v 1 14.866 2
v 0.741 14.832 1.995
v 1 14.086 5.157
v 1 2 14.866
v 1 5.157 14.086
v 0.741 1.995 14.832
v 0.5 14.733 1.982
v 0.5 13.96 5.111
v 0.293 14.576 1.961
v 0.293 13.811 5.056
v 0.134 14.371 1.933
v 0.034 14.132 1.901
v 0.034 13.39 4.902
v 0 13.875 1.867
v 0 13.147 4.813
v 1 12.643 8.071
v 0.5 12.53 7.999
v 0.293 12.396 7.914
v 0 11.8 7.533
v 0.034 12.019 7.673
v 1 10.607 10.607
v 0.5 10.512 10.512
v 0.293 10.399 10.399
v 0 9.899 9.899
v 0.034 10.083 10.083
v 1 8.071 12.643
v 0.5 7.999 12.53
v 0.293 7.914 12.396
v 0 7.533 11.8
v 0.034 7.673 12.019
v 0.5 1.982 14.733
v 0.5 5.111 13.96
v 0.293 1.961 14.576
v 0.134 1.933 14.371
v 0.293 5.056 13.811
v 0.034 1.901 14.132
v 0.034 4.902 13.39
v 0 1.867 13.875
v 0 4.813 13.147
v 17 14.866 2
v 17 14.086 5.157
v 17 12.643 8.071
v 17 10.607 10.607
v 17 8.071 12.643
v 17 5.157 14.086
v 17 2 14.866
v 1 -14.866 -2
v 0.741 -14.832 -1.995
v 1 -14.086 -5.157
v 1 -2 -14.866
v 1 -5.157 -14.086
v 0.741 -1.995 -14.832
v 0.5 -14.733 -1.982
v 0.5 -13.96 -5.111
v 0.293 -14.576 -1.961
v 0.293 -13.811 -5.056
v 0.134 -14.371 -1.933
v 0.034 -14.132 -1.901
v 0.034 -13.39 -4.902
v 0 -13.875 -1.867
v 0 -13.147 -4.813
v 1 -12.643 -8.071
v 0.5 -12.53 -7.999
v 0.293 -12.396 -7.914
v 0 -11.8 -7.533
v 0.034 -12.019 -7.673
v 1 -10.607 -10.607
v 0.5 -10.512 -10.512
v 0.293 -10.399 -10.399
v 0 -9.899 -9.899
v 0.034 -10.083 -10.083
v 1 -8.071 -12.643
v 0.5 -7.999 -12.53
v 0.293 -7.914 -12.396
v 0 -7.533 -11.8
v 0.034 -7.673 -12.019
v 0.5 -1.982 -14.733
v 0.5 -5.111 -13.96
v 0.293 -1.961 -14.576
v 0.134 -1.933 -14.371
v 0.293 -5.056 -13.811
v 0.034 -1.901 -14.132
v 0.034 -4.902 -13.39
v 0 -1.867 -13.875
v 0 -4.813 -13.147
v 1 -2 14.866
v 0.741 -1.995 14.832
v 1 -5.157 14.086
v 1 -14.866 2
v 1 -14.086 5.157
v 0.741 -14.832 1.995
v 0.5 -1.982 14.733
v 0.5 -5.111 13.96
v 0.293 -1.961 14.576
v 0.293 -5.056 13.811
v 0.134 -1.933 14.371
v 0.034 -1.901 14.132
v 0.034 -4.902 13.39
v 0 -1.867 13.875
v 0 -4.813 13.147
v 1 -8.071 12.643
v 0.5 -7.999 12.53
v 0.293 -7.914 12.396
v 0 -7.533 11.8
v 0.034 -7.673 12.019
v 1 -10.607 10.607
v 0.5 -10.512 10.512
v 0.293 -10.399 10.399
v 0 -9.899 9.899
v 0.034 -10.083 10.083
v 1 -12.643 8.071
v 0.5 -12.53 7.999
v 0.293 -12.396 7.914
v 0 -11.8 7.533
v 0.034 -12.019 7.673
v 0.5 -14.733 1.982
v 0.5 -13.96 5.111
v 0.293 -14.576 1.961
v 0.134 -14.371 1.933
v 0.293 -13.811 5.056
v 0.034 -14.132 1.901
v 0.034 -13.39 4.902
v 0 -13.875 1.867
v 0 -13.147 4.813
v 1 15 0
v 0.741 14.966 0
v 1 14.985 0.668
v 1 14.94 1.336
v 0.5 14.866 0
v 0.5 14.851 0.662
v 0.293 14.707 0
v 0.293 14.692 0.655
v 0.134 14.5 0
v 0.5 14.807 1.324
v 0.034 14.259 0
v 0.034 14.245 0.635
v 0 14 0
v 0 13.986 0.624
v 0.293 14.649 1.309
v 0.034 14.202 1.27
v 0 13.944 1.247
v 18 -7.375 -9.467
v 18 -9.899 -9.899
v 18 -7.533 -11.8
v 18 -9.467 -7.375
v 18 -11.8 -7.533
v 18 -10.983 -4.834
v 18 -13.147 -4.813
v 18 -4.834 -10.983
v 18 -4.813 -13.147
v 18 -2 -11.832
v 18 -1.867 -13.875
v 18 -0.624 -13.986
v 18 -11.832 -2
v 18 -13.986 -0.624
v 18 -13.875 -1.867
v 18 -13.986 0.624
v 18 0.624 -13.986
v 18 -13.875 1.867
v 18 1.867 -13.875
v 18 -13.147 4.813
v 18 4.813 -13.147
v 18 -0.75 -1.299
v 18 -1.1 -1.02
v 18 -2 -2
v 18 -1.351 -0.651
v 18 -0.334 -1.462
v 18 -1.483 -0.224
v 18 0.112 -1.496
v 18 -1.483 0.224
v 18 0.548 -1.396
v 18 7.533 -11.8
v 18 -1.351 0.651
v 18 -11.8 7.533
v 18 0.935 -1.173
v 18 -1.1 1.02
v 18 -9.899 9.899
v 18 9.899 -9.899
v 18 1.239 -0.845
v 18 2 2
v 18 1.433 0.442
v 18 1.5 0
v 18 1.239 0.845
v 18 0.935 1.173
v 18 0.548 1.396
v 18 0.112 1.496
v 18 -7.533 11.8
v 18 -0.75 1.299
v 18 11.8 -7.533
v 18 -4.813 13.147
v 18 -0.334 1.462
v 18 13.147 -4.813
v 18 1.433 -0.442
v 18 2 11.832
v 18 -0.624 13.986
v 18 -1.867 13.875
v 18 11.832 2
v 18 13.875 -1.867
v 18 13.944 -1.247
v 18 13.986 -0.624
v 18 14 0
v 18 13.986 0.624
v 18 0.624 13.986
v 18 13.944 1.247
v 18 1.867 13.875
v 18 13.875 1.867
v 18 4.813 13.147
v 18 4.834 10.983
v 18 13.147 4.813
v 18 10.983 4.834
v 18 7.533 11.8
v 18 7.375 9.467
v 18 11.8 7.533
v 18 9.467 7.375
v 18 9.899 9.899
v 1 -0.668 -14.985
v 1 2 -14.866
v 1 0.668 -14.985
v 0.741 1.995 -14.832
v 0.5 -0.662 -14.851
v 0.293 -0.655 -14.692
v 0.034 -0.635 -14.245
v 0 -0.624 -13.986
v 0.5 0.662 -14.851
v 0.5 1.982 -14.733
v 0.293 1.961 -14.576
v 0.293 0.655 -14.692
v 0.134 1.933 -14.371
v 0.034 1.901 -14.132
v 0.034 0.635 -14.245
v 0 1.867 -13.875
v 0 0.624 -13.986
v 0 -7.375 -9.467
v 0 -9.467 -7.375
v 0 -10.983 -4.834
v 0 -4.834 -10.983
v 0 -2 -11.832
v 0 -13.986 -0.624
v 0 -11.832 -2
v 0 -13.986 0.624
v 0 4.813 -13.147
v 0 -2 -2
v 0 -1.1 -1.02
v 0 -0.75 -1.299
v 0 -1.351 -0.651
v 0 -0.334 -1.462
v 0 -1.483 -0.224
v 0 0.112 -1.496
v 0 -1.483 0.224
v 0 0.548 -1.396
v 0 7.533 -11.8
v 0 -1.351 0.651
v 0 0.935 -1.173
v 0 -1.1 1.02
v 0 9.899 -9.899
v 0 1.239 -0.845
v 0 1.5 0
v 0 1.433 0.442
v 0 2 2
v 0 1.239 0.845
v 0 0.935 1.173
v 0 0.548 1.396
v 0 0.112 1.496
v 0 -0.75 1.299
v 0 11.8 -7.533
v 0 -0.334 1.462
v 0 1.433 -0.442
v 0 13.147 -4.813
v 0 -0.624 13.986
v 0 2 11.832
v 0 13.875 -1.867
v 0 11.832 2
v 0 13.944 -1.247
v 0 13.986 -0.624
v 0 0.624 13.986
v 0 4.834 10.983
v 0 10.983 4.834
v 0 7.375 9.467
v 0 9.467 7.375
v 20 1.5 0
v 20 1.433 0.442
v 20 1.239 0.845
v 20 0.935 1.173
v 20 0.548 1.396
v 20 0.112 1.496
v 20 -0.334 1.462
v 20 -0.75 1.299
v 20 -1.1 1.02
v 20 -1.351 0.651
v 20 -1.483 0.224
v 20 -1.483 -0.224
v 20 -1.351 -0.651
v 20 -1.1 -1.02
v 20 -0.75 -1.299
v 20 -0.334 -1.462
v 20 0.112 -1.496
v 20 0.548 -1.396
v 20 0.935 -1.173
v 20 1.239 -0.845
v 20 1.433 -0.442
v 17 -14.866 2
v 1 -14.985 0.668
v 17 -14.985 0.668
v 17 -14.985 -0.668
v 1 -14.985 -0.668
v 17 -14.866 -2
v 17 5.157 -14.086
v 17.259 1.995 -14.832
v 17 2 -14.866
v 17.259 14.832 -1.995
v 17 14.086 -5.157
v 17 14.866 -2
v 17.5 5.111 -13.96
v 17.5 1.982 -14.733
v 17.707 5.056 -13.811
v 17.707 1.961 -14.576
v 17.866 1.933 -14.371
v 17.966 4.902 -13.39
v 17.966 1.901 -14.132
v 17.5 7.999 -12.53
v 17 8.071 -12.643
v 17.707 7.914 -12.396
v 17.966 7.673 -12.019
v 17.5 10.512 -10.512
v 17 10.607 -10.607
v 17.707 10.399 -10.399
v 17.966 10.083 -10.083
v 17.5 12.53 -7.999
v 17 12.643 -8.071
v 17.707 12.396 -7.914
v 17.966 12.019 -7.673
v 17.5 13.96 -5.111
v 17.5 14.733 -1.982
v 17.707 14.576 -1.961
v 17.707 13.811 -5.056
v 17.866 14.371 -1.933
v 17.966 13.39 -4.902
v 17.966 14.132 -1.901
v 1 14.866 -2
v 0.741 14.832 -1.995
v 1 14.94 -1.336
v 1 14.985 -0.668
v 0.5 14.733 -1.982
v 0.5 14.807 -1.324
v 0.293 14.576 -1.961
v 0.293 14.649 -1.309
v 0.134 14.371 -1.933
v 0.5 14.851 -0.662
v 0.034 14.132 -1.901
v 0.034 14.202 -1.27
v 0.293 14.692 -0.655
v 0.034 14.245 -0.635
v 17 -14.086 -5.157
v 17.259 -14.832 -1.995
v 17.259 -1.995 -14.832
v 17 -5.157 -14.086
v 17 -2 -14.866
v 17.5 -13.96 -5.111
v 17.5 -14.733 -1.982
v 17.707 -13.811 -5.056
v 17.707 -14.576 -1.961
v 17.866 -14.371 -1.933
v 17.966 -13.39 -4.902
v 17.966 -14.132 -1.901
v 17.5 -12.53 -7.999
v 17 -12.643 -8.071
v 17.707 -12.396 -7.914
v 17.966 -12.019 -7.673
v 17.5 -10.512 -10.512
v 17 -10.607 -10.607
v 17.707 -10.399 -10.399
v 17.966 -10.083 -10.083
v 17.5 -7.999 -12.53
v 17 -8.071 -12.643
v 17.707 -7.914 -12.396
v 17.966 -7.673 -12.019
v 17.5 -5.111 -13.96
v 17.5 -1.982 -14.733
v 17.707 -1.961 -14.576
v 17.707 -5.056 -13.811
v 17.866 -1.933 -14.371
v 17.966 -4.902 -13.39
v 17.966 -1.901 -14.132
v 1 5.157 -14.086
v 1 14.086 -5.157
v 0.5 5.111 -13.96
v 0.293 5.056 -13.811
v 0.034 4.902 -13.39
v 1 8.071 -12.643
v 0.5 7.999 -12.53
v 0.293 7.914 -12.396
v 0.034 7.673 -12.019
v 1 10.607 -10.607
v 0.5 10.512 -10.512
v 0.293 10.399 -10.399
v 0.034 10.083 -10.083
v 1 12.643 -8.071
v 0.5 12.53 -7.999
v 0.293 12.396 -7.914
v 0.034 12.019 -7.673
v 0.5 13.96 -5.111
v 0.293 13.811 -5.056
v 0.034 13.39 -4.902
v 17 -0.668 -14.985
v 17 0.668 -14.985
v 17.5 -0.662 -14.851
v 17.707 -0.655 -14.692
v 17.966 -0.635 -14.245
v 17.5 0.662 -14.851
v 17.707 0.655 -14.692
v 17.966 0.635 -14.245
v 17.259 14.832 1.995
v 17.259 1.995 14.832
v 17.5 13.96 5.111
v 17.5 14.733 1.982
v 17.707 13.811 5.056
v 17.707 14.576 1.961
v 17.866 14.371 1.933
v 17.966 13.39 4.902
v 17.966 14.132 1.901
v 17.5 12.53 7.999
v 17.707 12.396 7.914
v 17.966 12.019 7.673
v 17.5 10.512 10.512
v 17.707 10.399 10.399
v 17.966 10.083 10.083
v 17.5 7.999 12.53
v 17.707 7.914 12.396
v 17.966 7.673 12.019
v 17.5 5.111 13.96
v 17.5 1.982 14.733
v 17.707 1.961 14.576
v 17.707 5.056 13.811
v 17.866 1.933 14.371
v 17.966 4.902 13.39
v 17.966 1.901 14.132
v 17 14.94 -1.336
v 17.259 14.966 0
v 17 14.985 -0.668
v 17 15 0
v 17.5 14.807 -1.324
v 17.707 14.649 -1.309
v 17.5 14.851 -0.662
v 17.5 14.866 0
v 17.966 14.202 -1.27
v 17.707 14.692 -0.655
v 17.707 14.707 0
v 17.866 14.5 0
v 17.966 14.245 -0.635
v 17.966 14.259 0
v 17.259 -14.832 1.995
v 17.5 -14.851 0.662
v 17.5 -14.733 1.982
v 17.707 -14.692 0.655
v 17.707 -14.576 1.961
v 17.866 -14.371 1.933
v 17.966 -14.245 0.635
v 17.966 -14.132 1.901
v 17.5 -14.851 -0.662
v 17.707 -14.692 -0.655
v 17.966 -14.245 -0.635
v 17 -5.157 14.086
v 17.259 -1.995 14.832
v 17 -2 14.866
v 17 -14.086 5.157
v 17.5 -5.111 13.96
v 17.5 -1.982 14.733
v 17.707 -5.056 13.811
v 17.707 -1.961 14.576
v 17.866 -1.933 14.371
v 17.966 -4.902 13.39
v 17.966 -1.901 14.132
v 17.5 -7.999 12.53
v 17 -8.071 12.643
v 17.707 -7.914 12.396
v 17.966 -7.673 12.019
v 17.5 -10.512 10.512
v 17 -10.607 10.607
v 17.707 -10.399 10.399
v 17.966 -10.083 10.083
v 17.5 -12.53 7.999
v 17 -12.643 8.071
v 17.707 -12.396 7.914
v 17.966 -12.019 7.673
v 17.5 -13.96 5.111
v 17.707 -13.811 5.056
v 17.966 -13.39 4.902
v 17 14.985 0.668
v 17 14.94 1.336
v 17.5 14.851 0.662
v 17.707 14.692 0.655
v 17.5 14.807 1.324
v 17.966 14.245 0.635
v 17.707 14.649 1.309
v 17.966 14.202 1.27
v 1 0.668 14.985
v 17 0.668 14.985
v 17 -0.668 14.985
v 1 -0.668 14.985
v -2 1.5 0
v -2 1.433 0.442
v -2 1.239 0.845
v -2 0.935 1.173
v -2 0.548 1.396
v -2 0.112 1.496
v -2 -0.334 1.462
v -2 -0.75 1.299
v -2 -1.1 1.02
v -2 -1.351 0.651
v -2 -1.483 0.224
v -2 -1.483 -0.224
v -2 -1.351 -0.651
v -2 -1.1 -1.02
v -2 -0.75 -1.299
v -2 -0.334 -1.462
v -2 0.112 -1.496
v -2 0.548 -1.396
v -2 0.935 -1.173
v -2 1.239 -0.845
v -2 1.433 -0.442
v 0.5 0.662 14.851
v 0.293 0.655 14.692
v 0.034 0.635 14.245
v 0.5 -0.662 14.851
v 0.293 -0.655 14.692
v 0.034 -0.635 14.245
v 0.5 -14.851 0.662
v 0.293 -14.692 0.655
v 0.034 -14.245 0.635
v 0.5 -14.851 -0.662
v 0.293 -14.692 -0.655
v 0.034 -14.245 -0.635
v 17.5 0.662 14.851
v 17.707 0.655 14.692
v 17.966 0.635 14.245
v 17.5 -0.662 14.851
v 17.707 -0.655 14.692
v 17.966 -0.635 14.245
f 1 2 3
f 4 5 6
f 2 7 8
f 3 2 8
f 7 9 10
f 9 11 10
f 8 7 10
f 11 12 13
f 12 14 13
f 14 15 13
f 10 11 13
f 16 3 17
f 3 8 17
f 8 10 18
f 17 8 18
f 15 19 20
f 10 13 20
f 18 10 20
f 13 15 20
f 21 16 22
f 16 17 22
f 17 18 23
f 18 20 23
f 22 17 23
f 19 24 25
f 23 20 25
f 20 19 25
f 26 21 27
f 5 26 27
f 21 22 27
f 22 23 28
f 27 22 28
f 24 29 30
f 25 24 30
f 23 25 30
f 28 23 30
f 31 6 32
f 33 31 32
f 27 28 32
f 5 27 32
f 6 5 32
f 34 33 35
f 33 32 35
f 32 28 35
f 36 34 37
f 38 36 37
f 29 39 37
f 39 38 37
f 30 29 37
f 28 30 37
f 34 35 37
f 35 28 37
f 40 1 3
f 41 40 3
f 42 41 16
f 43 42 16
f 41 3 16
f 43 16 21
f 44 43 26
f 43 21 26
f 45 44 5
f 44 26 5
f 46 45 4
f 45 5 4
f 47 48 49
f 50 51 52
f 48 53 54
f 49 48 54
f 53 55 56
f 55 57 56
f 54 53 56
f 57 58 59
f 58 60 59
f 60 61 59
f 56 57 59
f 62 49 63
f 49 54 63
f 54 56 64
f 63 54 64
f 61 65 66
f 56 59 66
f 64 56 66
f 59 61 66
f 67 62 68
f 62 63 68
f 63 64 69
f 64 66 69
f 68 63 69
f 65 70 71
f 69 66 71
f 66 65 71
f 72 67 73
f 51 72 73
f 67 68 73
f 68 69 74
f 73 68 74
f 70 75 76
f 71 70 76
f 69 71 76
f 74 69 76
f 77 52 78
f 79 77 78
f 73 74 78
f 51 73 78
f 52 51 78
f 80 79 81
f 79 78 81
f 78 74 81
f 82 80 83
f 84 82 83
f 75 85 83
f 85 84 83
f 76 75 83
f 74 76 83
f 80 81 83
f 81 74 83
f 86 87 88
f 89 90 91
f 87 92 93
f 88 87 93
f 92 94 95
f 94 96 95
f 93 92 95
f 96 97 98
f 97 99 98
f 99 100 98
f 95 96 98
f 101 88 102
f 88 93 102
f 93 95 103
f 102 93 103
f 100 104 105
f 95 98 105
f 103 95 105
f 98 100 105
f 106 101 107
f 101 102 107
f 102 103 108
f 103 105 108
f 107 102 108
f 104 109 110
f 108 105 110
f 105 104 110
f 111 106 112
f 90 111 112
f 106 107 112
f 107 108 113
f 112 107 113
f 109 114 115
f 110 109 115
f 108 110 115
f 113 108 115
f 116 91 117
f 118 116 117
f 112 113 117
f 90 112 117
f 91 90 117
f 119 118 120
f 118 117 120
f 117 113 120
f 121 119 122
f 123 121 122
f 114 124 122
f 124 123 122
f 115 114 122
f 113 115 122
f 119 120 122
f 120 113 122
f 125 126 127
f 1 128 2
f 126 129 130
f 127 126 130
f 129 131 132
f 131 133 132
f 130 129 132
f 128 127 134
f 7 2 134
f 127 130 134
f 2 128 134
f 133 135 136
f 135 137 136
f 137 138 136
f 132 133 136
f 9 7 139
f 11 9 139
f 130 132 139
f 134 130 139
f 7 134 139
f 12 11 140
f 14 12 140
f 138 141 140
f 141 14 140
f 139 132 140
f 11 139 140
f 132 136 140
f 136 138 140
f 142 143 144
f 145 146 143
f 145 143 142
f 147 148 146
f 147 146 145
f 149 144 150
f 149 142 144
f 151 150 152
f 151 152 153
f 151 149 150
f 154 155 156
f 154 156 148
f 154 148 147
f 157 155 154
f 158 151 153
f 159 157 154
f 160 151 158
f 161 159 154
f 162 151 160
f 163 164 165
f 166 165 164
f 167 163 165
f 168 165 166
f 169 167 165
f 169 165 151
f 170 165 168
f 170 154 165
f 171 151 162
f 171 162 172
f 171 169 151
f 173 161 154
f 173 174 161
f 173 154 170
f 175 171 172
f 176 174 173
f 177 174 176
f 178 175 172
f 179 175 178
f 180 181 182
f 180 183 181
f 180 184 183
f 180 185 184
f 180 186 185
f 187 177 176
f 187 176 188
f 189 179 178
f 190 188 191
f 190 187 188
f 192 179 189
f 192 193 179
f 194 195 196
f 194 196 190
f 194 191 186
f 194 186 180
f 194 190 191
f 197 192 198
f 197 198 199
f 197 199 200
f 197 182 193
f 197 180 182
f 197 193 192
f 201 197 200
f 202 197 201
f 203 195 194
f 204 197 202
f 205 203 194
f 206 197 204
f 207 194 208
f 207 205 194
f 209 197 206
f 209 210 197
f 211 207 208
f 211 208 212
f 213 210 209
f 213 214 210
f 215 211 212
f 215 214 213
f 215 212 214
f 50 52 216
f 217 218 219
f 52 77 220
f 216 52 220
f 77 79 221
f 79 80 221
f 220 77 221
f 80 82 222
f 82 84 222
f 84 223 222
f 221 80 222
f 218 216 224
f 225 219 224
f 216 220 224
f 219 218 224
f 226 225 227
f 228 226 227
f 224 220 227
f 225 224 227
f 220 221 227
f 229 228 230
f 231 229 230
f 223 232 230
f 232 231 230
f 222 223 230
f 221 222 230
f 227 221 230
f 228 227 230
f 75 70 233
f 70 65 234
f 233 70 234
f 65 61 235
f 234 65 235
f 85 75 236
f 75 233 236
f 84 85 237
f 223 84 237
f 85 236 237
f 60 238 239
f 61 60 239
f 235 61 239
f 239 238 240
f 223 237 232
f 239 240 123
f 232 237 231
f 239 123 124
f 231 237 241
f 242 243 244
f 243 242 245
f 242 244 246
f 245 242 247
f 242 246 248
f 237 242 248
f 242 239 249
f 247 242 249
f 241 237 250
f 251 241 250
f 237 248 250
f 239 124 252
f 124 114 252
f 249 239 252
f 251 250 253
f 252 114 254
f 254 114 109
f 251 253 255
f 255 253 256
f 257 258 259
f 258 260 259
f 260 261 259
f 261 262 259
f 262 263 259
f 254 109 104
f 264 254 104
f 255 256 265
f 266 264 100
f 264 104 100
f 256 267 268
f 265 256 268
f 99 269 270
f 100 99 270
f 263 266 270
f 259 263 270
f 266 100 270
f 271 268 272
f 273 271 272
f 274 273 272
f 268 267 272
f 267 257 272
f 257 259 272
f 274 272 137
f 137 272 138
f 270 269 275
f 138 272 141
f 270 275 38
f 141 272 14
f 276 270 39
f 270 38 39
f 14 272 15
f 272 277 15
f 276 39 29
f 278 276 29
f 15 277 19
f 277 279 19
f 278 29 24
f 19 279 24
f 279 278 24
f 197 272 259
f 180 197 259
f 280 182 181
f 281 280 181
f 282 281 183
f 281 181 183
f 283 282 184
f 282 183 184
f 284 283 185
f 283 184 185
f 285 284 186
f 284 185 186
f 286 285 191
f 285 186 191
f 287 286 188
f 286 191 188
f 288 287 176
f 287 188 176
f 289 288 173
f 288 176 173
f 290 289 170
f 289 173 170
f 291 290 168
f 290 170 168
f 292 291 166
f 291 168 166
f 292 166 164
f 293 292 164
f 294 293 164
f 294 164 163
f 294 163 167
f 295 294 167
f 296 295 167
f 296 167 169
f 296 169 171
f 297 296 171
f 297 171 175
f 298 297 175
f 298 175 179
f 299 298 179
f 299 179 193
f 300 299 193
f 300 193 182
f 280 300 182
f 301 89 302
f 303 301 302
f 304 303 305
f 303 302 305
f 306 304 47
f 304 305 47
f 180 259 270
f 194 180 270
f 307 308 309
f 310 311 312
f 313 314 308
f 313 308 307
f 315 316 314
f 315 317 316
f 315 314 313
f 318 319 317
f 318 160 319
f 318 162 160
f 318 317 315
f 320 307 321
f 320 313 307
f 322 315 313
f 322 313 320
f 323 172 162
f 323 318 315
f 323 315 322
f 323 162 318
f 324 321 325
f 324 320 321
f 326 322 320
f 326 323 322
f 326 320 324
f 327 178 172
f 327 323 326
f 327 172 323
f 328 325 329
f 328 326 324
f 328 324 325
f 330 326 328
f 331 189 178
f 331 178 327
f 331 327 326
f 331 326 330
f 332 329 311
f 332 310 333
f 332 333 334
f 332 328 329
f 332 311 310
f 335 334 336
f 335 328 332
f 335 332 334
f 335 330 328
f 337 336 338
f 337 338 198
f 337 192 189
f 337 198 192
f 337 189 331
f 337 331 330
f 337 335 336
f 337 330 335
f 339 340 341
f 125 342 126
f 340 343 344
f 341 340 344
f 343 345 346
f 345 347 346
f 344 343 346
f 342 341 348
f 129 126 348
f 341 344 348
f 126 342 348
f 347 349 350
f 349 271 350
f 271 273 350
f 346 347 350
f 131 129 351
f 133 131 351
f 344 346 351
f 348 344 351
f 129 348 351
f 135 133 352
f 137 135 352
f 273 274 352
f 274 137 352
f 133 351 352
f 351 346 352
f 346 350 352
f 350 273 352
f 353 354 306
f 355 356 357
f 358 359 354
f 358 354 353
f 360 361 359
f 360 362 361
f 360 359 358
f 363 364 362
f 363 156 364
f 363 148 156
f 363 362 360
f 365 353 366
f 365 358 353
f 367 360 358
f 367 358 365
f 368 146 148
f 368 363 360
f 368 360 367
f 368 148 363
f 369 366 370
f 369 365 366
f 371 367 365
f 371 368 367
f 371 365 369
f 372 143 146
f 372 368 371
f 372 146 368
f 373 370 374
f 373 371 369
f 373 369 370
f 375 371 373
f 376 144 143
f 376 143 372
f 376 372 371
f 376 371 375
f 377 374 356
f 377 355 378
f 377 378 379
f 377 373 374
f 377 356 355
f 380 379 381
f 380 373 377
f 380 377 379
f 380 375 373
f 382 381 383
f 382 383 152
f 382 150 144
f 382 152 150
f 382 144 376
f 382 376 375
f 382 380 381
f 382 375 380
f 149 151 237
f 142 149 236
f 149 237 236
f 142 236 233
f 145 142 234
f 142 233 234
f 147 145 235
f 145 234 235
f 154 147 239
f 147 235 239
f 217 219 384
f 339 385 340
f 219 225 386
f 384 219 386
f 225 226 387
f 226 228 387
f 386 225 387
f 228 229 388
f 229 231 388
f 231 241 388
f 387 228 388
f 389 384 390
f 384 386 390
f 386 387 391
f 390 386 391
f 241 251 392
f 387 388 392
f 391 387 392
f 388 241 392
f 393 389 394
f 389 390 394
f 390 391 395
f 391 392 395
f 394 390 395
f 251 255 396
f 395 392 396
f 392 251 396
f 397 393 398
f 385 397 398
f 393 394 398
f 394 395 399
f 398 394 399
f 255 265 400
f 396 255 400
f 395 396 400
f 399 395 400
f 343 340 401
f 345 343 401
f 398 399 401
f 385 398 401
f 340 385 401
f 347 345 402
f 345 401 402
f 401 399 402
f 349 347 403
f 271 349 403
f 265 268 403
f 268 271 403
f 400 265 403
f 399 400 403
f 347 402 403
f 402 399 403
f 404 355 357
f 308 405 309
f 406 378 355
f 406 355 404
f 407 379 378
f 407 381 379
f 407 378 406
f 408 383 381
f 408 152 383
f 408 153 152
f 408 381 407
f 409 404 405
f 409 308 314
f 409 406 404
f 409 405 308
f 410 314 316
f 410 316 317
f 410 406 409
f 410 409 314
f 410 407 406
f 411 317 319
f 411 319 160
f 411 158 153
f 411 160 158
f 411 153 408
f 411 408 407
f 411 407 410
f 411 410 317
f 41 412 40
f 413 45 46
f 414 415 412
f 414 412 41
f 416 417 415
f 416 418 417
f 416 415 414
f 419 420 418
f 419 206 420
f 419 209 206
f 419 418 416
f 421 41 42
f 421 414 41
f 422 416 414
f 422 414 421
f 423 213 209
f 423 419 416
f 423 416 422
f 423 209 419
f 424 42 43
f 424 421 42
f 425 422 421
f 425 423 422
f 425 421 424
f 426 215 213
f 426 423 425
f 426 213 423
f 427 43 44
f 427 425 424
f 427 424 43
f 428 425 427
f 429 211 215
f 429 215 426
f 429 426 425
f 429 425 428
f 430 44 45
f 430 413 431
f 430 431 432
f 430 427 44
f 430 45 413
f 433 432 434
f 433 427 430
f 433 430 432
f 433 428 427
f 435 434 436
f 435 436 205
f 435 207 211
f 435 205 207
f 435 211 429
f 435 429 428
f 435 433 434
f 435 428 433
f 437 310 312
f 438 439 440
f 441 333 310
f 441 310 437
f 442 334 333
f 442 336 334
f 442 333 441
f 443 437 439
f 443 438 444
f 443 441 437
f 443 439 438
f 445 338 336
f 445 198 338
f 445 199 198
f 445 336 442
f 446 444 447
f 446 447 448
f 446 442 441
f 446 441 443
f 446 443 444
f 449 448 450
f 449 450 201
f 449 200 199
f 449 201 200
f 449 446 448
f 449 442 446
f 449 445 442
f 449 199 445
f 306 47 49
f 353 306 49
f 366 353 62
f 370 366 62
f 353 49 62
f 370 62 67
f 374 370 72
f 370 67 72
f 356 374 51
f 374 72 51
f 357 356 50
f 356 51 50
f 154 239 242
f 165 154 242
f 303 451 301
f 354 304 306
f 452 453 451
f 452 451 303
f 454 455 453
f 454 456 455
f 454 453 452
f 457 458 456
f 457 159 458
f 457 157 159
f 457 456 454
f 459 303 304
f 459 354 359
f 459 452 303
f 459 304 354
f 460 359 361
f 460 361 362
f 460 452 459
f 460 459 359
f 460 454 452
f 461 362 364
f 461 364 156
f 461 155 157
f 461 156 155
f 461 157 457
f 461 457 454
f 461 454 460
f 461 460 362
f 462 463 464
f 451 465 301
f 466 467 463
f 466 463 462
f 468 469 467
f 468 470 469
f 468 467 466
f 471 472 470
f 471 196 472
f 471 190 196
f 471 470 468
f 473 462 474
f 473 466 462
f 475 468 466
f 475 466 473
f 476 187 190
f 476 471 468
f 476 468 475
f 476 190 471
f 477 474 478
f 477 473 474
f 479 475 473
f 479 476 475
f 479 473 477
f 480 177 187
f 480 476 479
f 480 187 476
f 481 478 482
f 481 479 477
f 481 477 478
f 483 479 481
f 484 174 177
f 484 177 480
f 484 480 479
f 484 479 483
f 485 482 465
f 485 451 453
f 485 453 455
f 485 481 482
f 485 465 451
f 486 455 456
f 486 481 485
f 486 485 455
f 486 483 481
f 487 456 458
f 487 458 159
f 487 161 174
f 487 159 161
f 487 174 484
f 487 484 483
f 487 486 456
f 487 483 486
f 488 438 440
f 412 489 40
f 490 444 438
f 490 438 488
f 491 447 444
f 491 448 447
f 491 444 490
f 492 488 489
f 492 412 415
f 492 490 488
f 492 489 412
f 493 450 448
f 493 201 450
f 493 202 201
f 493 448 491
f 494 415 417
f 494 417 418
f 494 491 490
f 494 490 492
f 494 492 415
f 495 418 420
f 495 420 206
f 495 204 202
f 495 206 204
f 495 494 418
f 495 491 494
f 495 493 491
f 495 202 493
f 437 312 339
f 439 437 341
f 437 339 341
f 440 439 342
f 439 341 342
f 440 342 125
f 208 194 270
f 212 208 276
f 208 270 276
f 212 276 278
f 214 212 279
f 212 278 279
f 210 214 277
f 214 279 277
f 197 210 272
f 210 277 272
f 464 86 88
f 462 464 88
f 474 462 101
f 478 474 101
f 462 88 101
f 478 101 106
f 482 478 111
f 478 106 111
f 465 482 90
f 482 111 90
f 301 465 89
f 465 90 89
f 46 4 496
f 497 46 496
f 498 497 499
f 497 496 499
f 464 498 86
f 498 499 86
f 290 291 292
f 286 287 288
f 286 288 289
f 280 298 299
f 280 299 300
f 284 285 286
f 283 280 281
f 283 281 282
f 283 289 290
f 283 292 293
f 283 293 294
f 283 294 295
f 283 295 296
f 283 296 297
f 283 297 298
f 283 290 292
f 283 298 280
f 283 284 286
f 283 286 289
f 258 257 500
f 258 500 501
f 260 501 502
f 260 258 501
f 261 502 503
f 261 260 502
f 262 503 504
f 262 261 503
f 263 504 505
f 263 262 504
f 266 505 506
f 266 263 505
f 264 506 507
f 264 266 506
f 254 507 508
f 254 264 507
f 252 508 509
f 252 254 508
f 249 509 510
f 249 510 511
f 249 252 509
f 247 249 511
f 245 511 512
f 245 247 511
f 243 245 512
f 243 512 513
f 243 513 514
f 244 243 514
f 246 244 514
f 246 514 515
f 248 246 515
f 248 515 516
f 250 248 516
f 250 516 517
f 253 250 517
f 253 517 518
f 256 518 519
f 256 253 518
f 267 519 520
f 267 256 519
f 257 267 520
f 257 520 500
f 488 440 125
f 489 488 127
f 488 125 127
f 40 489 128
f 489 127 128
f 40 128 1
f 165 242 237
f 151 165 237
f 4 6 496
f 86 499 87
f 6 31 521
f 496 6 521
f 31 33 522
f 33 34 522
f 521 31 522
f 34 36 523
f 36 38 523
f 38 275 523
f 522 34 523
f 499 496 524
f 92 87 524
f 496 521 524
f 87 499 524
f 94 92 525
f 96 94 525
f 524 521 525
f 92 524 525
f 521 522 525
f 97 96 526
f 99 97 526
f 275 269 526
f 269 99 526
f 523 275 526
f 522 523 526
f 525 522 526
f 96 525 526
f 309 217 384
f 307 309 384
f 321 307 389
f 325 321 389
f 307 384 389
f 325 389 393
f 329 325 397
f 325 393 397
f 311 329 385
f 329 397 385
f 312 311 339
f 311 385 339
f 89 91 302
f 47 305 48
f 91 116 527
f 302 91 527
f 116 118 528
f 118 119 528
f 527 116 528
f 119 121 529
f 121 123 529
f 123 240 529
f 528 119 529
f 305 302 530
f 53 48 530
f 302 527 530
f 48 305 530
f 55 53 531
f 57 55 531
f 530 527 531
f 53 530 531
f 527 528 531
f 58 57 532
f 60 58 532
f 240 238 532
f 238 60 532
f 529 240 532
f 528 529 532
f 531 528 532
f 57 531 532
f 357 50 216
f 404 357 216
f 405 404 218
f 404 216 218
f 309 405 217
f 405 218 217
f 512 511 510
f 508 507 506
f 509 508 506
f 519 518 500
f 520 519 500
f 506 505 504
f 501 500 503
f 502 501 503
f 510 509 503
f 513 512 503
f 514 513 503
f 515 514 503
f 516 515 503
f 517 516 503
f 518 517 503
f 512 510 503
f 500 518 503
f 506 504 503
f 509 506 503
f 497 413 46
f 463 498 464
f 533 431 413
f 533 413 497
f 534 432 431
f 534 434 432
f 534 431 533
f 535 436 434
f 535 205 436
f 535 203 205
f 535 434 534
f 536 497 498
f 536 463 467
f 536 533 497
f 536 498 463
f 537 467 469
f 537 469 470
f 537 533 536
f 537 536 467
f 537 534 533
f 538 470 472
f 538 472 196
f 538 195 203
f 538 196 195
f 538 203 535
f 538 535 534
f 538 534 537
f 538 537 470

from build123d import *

# Parameters (mm, degrees)
F0_R     = 1.5
F1_DEPTH = 18
F2_R     = 1
F3_DEPTH = 20
F4_DEPTH = 2


with BuildPart() as f1:
    # F0 (on Right) → F1 (new body)
    with BuildSketch(Plane.YZ):
        with BuildLine():
            ThreePointArc((14.8660687473, -2), (14.9664797332, -1.0022396895), (15, 0))
            ThreePointArc((15, 0), (14.9664797332, 1.0022396895), (14.8660687473, 2))
            ThreePointArc((14.8660687473, 2), (10.6066017178, 10.6066017178), (2, 14.8660687473))
            ThreePointArc((2, 14.8660687473), (0, 15), (-2, 14.8660687473))
            ThreePointArc((-2, 14.8660687473), (-10.6066017178, 10.6066017178), (-14.8660687473, 2))
            ThreePointArc((-14.8660687473, 2), (-15, 0), (-14.8660687473, -2))
            ThreePointArc((-14.8660687473, -2), (-10.6066017178, -10.6066017178), (-2, -14.8660687473))
            ThreePointArc((-2, -14.8660687473), (0, -15), (2, -14.8660687473))
            ThreePointArc((2, -14.8660687473), (10.6066017178, -10.6066017178), (14.8660687473, -2))
        make_face()
        with BuildLine():
            ThreePointArc((-2, -11.8321595662), (-8.4852813742, -8.4852813742), (-11.8321595662, -2))
            Line((-11.8321595662, -2), (-2, -2))
            Line((-2, -2), (-2, -11.8321595662))
        make_face(mode=Mode.SUBTRACT)
        Circle(F0_R, mode=Mode.SUBTRACT)
        with BuildLine():
            ThreePointArc((2, 11.8321595662), (8.4852813742, 8.4852813742), (11.8321595662, 2))
            Line((11.8321595662, 2), (2, 2))
            Line((2, 2), (2, 11.8321595662))
        make_face(mode=Mode.SUBTRACT)
    extrude(amount=F1_DEPTH)

    # F2
    f2_edges = [f1.edges().sort_by_distance(p)[0] for p in [
        (0, 14.866069, 2),
        (18, 14.866069, 2),
    ]]
    fillet(f2_edges, radius=F2_R)

    # F0 (on Right) → F3 (join)
    with BuildSketch(Plane.YZ):
        Circle(F0_R)
    extrude(amount=F3_DEPTH)

    # F0 (on Right) → F4 (join)
    with BuildSketch(Plane.YZ):
        Circle(F0_R)
    extrude(amount=-F4_DEPTH)


solid = f1.part
